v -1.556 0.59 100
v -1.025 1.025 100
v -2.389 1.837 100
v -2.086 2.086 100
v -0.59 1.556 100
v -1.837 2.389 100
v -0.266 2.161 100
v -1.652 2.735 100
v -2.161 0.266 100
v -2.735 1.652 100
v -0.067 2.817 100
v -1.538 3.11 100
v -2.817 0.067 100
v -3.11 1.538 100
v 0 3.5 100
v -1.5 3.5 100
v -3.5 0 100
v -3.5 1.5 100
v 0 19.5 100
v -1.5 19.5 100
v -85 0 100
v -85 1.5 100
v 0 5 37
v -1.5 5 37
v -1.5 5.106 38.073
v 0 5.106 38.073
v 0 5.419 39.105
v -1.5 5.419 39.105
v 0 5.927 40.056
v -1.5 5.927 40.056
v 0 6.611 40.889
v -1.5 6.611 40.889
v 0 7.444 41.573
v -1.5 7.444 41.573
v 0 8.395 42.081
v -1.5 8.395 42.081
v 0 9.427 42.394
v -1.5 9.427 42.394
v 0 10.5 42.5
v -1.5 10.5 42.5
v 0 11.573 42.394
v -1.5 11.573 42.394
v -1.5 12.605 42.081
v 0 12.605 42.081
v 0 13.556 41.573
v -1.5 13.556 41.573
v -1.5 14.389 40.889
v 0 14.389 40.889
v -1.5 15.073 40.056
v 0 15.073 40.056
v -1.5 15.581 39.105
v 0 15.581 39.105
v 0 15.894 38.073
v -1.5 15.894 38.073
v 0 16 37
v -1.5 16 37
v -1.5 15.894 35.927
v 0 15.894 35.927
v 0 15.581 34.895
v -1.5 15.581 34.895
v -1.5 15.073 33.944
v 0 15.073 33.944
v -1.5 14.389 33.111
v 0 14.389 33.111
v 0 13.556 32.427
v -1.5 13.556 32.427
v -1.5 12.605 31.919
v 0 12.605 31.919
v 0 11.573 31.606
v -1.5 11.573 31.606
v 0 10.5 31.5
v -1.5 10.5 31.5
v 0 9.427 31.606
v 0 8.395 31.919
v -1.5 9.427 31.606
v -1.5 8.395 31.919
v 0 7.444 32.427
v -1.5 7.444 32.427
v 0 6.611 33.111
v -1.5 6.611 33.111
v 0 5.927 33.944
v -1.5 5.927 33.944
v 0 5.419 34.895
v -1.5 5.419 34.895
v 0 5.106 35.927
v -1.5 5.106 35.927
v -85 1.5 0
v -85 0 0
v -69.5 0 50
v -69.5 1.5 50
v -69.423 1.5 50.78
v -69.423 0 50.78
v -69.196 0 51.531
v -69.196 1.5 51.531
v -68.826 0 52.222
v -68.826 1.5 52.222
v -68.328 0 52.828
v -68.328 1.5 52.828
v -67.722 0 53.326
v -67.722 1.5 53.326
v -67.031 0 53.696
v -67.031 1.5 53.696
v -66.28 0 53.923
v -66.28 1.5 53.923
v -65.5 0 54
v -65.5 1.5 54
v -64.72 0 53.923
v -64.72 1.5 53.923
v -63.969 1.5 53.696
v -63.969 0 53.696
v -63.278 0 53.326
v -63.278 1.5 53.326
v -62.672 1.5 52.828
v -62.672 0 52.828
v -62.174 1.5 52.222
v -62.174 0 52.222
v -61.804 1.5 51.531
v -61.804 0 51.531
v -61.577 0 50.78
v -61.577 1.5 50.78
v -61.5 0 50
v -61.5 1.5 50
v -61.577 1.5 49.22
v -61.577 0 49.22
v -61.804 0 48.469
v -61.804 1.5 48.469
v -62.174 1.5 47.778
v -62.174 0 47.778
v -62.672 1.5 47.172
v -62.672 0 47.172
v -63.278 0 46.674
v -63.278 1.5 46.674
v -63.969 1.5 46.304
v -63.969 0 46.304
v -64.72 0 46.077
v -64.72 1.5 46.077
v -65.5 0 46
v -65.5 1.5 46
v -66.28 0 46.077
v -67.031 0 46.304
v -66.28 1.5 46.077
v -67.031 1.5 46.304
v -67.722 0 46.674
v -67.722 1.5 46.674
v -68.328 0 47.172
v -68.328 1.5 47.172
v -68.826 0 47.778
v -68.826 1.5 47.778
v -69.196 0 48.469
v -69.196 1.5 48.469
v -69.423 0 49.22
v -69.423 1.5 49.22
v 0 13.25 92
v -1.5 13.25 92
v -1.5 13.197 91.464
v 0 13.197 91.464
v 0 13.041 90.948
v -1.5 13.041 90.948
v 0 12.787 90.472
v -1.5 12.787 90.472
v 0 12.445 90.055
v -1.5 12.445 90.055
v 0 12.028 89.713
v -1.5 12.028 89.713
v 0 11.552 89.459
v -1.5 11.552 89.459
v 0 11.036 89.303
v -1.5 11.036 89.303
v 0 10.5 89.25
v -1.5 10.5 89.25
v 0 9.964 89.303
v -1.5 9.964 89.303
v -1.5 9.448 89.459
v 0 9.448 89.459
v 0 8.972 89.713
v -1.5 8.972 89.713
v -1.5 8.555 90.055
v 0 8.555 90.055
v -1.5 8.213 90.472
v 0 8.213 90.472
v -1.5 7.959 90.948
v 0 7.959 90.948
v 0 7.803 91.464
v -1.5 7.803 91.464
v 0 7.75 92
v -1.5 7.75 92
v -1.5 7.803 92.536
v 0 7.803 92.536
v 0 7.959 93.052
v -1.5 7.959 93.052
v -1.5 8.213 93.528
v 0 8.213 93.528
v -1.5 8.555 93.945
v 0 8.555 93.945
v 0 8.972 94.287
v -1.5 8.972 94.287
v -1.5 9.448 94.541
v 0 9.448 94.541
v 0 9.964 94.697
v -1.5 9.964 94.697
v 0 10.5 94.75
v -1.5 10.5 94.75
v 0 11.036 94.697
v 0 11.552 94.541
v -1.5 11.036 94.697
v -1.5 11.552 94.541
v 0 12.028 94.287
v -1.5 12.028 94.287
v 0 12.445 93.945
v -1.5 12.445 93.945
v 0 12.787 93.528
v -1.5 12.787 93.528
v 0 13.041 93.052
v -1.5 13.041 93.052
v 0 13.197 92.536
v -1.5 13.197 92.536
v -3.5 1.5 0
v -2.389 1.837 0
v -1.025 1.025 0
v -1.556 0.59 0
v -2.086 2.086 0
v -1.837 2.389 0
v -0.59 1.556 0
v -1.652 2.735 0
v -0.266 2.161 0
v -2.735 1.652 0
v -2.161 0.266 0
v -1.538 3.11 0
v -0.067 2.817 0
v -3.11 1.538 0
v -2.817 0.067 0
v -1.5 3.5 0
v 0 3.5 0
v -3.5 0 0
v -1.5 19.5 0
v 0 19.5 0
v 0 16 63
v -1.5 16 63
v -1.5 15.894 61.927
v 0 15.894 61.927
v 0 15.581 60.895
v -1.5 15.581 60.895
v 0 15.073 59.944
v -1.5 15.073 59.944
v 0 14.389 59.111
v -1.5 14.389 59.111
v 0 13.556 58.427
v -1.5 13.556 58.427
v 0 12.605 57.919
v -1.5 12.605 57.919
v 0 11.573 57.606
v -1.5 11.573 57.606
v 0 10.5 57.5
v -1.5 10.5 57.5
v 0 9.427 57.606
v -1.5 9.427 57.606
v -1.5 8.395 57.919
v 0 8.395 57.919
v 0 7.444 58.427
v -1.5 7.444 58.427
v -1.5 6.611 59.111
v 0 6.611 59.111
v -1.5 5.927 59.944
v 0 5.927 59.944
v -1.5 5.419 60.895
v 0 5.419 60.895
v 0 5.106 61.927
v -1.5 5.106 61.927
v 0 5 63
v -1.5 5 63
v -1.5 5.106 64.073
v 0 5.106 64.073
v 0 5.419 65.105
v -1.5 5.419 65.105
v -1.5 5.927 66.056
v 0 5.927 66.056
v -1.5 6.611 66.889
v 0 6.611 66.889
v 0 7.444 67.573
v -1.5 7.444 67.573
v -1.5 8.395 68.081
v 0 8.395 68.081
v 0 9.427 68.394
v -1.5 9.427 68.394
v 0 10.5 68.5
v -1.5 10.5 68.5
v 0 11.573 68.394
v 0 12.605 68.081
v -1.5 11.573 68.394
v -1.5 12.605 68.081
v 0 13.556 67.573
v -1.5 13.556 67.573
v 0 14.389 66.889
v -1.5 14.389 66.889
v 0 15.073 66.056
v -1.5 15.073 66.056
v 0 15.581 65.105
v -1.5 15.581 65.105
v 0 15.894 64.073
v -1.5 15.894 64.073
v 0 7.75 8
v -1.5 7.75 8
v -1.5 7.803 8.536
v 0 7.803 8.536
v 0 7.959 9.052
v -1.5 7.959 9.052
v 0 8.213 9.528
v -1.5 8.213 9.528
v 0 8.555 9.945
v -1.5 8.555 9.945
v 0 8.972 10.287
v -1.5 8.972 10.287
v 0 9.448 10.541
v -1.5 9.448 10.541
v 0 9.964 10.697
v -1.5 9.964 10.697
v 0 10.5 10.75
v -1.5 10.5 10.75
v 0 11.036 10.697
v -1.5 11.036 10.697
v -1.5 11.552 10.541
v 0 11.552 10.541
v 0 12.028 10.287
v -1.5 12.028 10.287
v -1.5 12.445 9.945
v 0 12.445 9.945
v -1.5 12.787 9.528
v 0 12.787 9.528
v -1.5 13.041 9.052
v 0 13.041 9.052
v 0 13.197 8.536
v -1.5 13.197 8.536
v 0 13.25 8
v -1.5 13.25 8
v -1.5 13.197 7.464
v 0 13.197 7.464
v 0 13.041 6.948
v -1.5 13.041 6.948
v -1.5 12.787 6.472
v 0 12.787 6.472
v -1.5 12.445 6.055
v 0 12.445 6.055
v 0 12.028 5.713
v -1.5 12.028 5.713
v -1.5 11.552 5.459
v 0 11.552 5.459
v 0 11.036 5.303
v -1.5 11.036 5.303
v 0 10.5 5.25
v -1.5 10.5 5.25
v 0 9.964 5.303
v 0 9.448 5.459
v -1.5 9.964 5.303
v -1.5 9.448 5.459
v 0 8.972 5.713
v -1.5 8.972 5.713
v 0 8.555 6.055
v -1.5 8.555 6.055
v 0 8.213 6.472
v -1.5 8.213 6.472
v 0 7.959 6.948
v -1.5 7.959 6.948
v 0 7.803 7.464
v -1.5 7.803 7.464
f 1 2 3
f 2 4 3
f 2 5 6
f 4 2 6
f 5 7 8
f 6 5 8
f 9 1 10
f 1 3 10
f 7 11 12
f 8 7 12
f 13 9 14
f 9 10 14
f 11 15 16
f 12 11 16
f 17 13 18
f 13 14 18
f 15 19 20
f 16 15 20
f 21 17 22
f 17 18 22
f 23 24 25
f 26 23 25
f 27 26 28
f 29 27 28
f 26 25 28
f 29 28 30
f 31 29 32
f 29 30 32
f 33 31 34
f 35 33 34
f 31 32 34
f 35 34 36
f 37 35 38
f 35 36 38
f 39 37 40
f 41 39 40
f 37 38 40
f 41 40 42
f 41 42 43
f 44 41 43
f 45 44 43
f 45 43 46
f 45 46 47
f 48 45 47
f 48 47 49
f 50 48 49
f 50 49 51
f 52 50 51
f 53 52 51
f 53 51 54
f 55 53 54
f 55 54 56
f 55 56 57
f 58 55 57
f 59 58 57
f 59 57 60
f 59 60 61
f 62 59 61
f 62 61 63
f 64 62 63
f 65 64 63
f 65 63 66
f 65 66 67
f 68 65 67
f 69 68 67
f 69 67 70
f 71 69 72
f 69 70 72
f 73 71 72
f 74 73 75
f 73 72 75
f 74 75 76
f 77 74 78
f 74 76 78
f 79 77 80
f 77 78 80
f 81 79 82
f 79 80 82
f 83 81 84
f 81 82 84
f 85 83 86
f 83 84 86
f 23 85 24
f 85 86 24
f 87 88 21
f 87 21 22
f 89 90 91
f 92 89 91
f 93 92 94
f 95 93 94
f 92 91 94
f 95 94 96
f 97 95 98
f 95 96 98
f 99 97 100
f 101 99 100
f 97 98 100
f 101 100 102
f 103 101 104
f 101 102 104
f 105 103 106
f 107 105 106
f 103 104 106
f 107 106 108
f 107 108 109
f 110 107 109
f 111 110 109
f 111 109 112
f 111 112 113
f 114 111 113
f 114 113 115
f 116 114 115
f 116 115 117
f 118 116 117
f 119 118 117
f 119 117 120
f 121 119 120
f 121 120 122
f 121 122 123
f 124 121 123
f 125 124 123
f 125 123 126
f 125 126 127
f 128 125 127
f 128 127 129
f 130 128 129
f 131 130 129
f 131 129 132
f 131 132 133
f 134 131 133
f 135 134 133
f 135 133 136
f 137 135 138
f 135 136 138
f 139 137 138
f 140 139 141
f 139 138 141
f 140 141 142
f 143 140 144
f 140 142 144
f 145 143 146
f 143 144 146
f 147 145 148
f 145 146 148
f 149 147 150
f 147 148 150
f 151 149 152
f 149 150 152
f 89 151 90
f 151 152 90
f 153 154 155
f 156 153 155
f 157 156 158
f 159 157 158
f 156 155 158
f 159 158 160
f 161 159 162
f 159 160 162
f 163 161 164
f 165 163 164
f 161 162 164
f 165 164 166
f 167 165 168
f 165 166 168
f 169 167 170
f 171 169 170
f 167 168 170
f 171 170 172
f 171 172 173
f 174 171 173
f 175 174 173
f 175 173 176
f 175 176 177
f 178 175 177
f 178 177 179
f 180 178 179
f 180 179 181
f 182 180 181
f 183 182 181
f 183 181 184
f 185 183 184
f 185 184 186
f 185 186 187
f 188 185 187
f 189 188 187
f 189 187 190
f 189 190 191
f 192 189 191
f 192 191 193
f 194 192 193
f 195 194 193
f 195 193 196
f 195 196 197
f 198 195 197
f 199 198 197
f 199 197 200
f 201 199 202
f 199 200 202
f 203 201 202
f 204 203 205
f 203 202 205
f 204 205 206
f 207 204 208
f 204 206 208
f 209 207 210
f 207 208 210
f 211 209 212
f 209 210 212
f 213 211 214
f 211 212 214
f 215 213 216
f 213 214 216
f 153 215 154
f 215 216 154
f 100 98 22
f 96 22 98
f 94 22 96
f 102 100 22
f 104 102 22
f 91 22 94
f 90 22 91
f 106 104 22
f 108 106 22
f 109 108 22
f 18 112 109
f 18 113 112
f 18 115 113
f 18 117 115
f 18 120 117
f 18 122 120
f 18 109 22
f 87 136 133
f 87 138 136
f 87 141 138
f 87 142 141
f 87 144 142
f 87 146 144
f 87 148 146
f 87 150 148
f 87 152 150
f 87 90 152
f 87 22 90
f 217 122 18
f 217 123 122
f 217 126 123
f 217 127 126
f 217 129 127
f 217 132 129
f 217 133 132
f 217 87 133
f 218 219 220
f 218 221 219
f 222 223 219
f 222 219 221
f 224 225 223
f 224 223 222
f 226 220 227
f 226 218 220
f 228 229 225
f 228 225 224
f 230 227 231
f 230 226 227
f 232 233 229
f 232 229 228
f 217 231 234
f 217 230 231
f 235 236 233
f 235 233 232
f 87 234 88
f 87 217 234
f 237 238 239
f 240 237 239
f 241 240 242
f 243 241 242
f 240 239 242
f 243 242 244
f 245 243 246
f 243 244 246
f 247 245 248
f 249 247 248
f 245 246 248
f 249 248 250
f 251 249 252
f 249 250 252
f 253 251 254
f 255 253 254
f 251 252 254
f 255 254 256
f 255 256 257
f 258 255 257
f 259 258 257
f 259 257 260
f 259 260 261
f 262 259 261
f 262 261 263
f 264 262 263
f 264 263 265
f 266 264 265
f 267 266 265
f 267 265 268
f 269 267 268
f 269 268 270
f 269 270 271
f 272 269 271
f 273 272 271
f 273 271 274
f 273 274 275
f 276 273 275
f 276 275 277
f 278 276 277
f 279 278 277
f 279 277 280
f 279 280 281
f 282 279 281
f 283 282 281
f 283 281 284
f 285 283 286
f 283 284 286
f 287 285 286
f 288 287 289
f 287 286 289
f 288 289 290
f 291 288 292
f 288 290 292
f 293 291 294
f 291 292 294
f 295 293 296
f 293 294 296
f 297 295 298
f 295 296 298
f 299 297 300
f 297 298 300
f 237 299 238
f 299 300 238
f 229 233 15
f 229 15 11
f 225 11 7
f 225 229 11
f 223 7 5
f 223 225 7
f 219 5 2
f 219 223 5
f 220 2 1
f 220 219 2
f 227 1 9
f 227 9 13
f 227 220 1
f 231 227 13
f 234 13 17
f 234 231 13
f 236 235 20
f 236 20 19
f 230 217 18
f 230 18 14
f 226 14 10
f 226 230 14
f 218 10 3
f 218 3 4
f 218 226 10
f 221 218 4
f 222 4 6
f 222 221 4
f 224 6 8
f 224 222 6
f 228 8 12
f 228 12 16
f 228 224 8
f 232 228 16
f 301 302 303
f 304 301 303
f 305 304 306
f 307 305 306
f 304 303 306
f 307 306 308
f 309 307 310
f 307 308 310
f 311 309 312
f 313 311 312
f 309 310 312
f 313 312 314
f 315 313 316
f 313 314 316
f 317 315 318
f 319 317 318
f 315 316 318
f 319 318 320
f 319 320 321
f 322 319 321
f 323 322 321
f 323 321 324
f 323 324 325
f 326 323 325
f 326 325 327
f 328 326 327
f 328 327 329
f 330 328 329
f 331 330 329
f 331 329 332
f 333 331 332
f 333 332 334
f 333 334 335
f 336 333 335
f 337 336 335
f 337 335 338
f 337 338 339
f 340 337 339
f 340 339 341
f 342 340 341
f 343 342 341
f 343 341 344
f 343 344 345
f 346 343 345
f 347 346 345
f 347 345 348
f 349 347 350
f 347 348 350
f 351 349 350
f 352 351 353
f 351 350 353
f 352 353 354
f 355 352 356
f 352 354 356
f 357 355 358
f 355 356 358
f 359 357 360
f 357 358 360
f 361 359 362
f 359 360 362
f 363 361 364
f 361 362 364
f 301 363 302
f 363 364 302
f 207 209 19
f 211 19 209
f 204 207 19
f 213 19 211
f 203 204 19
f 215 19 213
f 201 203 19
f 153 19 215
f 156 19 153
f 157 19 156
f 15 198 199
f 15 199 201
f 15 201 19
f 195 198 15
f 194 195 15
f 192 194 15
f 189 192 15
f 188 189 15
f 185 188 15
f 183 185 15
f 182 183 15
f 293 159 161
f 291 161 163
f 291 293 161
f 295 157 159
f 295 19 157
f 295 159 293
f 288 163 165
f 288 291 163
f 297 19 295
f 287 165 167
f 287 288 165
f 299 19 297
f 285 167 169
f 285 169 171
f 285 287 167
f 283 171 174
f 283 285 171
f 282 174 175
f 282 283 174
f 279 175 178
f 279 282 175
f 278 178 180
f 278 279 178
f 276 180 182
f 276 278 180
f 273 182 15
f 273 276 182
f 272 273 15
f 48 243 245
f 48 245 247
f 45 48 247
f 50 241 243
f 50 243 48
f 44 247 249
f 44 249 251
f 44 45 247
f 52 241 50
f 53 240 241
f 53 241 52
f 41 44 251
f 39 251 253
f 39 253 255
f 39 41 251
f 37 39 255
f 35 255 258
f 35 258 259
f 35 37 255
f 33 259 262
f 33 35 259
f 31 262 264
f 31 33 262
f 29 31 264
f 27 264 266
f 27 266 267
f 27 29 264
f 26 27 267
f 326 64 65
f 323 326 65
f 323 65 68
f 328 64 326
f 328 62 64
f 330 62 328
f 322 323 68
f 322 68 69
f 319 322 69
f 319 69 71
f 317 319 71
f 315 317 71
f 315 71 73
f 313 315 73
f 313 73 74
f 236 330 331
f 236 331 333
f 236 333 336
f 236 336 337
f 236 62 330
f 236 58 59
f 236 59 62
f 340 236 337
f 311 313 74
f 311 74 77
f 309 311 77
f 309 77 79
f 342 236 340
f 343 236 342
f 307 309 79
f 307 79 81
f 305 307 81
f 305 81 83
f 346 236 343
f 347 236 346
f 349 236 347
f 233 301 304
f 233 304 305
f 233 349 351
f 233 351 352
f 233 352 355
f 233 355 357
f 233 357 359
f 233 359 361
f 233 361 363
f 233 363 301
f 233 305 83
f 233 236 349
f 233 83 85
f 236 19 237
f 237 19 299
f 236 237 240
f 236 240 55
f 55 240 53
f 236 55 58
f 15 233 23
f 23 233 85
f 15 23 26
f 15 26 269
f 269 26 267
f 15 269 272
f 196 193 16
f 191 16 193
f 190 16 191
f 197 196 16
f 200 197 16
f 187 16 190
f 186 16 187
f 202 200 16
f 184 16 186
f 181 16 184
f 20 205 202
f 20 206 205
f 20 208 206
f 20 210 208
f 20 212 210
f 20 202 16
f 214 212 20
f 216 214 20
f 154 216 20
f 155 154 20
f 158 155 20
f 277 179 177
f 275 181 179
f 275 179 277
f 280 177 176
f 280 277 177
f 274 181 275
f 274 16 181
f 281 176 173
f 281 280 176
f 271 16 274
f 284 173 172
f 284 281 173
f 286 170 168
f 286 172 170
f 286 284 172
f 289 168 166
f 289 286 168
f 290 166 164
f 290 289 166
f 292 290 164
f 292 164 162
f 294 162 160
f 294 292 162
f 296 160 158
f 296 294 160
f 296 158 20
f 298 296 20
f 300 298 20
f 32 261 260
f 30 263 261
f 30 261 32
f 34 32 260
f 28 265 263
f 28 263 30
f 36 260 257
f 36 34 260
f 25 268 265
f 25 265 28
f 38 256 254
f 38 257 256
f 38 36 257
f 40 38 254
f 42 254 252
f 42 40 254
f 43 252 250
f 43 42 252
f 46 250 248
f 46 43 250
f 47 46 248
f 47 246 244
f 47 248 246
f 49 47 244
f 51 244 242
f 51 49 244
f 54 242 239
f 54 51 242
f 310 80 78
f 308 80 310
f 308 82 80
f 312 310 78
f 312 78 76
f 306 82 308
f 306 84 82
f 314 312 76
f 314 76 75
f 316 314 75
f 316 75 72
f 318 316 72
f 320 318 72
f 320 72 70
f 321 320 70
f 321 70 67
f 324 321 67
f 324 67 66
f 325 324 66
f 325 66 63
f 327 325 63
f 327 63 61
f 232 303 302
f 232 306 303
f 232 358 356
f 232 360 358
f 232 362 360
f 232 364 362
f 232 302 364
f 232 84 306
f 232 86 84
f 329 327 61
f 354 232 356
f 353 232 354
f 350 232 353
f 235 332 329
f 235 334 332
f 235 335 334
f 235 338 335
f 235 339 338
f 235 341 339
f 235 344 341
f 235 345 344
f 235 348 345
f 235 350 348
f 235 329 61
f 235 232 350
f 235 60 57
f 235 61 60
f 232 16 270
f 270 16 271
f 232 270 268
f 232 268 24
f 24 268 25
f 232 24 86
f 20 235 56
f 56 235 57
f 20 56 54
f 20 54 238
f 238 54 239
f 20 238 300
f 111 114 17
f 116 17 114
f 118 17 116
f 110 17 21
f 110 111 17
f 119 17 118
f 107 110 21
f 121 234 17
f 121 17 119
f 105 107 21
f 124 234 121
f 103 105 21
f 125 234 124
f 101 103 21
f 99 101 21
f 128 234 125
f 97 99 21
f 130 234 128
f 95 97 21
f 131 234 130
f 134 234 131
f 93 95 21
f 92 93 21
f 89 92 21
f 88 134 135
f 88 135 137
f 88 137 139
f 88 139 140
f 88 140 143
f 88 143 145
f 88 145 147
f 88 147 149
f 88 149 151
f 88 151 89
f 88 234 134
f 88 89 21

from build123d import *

# Parameters (mm, degrees)
BASE_FLANGE1_DEPTH = 100
SKETCH6_R          = 5.5
SKETCH6_R_2        = 2.75
CUT_EXTRUDE1_DEPTH = 10
SKETCH7_R          = 4
CUT_EXTRUDE2_DEPTH = 10


# Sheet-metal steps are written as plain solids
with BuildPart() as part:
    # Sketch1 → Base-Flange1 (new body)
    with BuildSketch(Plane.XY):
        with BuildLine():
            Line((0, 19.5), (0, 3.5))
            ThreePointArc((0, 3.5), (-1.025126266, 1.025126266), (-3.5, 0))
            Line((-3.5, 0), (-85, 0))
            Line((-85, 0), (-85, 1.5))
            Line((-85, 1.5), (-3.5, 1.5))
            ThreePointArc((-3.5, 1.5), (-2.085786438, 2.085786438), (-1.5, 3.5))
            Line((-1.5, 3.5), (-1.5, 19.5))
            Line((-1.5, 19.5), (0, 19.5))
        make_face()
    extrude(amount=BASE_FLANGE1_DEPTH)

    # Sketch6 → Cut-Extrude1 (cut)
    with BuildSketch(Plane.ZY.offset(1.5)):
        with Locations(Location((37, 10.5, 0), (0, 0, 270))):
            Circle(SKETCH6_R)
        with Locations(Location((8, 10.5, 0), (0, 0, 270))):
            Circle(SKETCH6_R_2)
        with Locations(Location((92, 10.5, 0), (0, 0, 90))):
            Circle(SKETCH6_R_2)
        with Locations(Location((63, 10.5, 0), (0, 0, 90))):
            Circle(SKETCH6_R)
    extrude(amount=-CUT_EXTRUDE1_DEPTH, mode=Mode.SUBTRACT)

    # Sketch7 → Cut-Extrude2 (cut)
    with BuildSketch(Plane(origin=(0, 1.5, 0), x_dir=(1, 0, 0), z_dir=(0, 1, 0))):
        with Locations(Location((-65.5, -50, 0), (0, 0, 180))):
            Circle(SKETCH7_R)
    extrude(amount=-CUT_EXTRUDE2_DEPTH, mode=Mode.SUBTRACT)


solid = part.part
